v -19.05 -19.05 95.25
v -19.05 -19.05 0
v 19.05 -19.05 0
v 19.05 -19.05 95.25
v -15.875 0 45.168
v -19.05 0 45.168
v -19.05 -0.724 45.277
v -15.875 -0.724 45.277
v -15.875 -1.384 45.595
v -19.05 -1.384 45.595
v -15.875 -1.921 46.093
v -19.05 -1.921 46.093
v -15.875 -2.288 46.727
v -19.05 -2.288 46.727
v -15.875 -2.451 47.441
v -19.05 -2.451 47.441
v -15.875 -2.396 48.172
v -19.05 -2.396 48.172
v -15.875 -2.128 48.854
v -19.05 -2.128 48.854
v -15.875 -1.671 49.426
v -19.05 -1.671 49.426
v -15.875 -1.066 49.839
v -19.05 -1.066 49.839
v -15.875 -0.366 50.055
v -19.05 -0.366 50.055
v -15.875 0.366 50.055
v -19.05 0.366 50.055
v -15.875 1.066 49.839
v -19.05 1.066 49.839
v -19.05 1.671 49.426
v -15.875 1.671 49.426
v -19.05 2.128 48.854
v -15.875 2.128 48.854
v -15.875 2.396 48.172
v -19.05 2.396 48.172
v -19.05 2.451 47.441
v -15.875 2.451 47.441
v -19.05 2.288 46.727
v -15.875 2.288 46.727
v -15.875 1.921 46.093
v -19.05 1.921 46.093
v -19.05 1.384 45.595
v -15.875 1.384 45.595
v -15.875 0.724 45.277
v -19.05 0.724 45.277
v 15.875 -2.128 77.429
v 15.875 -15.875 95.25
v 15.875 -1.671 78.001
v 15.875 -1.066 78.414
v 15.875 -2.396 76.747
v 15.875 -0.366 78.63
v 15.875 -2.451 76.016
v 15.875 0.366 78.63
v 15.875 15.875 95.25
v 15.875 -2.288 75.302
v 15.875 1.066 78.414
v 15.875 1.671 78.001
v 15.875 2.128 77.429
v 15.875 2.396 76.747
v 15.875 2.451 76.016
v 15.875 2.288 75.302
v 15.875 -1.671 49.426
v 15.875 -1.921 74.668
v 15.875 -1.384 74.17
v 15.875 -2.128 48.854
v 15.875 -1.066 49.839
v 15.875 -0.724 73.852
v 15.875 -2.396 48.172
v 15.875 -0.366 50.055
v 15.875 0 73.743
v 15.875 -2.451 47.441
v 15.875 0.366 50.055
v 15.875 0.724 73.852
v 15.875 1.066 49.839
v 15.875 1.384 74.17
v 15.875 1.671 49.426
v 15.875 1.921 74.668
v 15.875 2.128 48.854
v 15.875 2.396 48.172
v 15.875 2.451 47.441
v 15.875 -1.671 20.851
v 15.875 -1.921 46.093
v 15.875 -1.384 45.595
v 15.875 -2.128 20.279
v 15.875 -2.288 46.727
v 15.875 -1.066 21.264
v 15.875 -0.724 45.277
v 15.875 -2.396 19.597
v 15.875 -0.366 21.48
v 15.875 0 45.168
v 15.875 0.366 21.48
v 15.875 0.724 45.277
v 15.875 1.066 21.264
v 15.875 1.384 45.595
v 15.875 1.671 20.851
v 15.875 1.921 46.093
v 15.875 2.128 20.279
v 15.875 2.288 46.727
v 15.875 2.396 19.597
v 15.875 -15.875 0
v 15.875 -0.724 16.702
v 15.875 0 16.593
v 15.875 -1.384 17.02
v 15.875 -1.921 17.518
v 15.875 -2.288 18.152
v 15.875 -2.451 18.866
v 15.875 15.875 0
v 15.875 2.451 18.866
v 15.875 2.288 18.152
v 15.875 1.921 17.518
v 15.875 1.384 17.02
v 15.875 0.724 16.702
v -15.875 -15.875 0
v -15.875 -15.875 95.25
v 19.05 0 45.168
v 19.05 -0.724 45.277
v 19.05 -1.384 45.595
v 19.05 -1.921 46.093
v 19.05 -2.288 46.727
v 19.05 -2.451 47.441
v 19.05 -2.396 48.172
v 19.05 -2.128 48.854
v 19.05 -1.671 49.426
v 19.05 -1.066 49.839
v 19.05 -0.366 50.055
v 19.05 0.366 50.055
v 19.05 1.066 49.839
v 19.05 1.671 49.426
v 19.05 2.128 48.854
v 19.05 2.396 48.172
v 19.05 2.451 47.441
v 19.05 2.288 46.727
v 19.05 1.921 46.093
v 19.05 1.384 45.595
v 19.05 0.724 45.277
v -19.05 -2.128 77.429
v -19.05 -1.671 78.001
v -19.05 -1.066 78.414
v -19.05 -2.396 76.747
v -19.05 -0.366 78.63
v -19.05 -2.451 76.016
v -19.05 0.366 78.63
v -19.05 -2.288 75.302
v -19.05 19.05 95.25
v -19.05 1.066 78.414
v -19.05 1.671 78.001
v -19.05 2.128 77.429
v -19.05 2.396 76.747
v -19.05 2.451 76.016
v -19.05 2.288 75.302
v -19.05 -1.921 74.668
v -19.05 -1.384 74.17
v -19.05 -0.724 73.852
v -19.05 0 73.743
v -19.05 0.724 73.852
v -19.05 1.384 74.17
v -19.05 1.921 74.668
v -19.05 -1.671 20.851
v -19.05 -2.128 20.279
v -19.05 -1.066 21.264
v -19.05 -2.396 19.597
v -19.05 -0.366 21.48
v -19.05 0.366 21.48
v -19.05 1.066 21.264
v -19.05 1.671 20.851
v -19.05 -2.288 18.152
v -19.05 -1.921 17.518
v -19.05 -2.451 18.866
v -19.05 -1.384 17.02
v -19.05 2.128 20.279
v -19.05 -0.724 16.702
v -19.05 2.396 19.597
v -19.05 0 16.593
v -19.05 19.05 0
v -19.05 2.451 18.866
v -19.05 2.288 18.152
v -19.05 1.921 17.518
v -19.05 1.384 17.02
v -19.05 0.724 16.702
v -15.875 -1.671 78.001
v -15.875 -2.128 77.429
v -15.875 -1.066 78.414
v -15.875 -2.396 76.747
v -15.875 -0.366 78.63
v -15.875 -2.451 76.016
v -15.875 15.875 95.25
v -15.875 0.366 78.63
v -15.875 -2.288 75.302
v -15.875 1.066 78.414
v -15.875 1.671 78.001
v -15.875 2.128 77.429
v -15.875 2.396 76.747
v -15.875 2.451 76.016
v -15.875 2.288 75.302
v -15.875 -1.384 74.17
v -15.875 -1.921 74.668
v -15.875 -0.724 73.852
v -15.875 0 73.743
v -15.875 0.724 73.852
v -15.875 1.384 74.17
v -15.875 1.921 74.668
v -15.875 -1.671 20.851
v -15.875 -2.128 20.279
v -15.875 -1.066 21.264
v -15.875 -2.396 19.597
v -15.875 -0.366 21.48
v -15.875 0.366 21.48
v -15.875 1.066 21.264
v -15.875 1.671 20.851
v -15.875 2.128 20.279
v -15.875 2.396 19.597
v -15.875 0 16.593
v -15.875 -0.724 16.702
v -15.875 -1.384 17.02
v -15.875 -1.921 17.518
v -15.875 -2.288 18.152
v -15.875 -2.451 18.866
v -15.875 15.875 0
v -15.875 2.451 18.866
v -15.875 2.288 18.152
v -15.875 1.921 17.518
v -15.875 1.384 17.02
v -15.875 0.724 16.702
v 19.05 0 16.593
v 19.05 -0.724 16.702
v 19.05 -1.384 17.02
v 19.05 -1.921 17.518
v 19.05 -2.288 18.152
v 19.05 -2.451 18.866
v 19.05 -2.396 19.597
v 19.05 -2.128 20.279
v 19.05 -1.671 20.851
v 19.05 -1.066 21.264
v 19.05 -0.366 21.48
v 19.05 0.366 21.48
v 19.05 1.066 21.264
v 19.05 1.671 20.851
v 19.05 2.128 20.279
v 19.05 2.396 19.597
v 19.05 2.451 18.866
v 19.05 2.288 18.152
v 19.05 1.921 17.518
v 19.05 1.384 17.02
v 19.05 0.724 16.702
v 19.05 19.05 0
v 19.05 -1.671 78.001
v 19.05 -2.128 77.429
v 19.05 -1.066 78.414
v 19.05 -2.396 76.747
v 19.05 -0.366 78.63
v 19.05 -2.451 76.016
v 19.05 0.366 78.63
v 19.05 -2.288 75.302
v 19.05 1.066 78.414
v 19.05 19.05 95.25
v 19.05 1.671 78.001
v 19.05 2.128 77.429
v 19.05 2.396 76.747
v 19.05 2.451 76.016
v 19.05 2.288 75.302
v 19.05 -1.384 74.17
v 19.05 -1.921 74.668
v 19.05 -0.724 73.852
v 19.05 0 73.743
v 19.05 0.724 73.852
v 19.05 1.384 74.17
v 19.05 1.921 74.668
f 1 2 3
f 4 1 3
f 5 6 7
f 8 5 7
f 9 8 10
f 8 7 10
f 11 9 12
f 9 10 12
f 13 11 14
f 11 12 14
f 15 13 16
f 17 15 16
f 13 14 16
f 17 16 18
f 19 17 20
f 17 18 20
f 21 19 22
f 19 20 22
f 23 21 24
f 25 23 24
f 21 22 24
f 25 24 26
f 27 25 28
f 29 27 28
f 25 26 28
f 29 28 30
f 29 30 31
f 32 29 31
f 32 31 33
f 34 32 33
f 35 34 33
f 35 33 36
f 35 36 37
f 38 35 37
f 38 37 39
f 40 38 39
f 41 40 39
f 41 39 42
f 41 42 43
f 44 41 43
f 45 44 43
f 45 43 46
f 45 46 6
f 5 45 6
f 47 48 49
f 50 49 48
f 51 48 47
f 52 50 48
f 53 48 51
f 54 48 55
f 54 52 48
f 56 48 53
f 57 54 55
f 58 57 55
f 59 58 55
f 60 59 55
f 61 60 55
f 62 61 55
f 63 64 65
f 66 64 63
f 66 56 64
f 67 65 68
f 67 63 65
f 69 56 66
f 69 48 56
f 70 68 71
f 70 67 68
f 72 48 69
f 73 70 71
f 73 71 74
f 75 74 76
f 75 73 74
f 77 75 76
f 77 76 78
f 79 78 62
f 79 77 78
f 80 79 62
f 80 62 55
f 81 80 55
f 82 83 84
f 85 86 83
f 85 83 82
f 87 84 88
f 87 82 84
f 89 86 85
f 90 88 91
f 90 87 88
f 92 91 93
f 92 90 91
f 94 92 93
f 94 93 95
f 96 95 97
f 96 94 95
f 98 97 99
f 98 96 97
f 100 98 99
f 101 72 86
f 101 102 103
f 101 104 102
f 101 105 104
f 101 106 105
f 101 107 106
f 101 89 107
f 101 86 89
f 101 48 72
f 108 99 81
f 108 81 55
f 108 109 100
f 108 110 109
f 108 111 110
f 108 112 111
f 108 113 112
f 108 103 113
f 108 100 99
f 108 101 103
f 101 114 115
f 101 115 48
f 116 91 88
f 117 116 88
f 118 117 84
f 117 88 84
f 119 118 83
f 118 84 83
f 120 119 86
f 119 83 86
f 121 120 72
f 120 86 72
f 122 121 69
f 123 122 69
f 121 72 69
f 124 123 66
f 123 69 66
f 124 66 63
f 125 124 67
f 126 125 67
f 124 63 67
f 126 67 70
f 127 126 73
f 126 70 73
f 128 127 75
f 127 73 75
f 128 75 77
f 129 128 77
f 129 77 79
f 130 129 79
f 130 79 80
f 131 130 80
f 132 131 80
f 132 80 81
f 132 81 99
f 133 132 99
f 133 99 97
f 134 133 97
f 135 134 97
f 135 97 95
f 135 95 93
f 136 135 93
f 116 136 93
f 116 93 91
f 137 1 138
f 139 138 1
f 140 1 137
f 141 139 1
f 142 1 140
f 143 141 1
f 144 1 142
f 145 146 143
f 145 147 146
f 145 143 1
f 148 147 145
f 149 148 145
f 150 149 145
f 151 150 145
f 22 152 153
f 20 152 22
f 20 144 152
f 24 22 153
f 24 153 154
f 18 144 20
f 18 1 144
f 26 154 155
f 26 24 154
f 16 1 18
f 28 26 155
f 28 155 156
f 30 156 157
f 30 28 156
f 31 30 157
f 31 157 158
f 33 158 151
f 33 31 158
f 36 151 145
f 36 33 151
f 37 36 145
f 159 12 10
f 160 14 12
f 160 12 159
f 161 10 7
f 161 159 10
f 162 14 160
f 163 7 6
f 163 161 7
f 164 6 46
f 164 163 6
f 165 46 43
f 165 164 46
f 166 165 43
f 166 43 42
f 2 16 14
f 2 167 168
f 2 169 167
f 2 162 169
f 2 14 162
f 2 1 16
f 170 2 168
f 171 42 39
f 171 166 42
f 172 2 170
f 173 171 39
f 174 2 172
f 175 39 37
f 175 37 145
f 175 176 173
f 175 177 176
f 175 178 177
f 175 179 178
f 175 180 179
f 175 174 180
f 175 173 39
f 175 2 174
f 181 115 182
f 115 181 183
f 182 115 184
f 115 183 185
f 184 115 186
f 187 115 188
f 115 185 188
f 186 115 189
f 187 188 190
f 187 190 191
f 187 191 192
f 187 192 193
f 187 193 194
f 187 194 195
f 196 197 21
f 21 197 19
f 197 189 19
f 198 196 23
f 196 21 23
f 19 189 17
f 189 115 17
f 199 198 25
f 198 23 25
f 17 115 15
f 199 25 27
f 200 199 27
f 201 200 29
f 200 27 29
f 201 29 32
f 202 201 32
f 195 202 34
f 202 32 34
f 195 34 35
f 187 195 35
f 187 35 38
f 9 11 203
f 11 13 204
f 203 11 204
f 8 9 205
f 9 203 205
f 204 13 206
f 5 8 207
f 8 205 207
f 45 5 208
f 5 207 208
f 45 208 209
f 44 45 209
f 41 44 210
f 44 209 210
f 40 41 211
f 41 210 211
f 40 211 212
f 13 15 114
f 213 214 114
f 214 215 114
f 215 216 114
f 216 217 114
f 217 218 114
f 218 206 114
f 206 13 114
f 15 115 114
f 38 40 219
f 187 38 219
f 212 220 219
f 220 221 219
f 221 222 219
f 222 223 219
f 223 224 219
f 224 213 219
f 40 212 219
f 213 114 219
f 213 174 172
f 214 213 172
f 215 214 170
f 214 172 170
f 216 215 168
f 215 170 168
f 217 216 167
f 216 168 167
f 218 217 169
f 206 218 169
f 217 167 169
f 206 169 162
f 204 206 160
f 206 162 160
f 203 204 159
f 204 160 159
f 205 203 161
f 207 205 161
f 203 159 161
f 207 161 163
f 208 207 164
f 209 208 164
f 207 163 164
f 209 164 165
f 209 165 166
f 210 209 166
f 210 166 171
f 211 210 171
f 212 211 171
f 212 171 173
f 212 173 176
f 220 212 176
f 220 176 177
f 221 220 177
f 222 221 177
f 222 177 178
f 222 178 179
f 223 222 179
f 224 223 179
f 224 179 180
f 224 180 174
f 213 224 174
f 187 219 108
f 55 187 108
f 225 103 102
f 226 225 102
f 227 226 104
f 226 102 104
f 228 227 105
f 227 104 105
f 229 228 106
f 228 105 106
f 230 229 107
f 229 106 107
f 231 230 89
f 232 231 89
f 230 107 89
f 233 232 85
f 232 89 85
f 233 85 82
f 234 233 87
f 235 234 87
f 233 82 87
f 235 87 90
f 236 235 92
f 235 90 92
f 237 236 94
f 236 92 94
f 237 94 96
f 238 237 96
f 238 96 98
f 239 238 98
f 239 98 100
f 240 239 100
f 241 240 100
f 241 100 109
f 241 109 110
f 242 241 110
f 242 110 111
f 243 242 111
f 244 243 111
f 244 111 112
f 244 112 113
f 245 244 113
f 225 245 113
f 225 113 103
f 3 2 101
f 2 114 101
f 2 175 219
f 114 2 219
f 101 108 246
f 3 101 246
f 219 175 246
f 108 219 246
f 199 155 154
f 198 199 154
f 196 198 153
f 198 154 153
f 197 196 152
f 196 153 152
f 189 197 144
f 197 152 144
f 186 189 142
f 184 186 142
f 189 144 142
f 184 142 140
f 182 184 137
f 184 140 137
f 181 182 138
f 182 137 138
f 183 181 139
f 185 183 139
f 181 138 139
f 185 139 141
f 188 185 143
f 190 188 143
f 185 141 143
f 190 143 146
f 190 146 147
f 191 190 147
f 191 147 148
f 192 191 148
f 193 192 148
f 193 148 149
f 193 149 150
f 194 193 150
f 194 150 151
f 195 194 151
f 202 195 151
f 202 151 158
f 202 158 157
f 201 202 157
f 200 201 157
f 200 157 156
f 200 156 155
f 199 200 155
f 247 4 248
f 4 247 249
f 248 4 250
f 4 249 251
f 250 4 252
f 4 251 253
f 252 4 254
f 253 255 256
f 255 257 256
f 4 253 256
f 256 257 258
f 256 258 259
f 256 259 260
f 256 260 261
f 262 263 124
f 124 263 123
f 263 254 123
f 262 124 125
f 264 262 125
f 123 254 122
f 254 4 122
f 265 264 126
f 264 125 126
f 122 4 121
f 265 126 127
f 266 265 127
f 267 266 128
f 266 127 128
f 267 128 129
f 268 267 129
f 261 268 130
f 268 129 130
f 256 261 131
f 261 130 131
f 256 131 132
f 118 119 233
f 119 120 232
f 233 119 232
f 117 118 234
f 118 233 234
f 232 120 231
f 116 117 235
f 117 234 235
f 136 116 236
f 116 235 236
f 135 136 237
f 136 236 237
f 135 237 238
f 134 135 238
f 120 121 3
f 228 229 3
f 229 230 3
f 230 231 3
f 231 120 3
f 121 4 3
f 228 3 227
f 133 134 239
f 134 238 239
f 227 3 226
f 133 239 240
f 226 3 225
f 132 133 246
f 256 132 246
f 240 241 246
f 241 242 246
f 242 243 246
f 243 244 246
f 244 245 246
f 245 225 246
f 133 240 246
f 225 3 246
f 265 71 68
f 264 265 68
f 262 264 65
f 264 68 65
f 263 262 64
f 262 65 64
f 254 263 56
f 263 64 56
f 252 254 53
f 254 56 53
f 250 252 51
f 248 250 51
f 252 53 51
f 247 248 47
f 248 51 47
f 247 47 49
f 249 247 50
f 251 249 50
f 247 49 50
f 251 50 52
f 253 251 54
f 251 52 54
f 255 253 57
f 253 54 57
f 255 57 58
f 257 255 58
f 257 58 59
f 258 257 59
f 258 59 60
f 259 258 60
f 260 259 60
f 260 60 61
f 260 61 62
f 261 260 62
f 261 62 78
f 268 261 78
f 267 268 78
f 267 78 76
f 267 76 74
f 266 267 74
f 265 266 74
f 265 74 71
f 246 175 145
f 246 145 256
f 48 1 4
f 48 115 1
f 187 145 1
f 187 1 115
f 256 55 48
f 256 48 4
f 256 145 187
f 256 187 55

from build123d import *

# Parameters (mm, degrees)
SKETCH1_W                    = 38.1
SKETCH1_H                    = 38.1
SKETCH1_W_2                  = 31.75
SKETCH1_H_2                  = 31.75
BOSS_EXTRUDE1_DEPTH          = 95.25
F_10_0_1935_DIAMETER_HOLE1_D = 4.9149


with BuildPart() as part:
    # Sketch1 → Boss-Extrude1 (new body)
    with BuildSketch(Plane.XY):
        Rectangle(SKETCH1_W, SKETCH1_H)
        Rectangle(SKETCH1_W_2, SKETCH1_H_2, mode=Mode.SUBTRACT)
    extrude(amount=BOSS_EXTRUDE1_DEPTH)

    # #10 (0.1935) Diameter Hole1 (through all)
    with Locations(Plane(origin=(19.05, 0, 19.05), x_dir=(0, 0, 1), z_dir=(1, 0, 0))):
        with Locations((0, 0), (57.15, 0), (28.575, 0)):
            Hole(F_10_0_1935_DIAMETER_HOLE1_D / 2)


solid = part.part
